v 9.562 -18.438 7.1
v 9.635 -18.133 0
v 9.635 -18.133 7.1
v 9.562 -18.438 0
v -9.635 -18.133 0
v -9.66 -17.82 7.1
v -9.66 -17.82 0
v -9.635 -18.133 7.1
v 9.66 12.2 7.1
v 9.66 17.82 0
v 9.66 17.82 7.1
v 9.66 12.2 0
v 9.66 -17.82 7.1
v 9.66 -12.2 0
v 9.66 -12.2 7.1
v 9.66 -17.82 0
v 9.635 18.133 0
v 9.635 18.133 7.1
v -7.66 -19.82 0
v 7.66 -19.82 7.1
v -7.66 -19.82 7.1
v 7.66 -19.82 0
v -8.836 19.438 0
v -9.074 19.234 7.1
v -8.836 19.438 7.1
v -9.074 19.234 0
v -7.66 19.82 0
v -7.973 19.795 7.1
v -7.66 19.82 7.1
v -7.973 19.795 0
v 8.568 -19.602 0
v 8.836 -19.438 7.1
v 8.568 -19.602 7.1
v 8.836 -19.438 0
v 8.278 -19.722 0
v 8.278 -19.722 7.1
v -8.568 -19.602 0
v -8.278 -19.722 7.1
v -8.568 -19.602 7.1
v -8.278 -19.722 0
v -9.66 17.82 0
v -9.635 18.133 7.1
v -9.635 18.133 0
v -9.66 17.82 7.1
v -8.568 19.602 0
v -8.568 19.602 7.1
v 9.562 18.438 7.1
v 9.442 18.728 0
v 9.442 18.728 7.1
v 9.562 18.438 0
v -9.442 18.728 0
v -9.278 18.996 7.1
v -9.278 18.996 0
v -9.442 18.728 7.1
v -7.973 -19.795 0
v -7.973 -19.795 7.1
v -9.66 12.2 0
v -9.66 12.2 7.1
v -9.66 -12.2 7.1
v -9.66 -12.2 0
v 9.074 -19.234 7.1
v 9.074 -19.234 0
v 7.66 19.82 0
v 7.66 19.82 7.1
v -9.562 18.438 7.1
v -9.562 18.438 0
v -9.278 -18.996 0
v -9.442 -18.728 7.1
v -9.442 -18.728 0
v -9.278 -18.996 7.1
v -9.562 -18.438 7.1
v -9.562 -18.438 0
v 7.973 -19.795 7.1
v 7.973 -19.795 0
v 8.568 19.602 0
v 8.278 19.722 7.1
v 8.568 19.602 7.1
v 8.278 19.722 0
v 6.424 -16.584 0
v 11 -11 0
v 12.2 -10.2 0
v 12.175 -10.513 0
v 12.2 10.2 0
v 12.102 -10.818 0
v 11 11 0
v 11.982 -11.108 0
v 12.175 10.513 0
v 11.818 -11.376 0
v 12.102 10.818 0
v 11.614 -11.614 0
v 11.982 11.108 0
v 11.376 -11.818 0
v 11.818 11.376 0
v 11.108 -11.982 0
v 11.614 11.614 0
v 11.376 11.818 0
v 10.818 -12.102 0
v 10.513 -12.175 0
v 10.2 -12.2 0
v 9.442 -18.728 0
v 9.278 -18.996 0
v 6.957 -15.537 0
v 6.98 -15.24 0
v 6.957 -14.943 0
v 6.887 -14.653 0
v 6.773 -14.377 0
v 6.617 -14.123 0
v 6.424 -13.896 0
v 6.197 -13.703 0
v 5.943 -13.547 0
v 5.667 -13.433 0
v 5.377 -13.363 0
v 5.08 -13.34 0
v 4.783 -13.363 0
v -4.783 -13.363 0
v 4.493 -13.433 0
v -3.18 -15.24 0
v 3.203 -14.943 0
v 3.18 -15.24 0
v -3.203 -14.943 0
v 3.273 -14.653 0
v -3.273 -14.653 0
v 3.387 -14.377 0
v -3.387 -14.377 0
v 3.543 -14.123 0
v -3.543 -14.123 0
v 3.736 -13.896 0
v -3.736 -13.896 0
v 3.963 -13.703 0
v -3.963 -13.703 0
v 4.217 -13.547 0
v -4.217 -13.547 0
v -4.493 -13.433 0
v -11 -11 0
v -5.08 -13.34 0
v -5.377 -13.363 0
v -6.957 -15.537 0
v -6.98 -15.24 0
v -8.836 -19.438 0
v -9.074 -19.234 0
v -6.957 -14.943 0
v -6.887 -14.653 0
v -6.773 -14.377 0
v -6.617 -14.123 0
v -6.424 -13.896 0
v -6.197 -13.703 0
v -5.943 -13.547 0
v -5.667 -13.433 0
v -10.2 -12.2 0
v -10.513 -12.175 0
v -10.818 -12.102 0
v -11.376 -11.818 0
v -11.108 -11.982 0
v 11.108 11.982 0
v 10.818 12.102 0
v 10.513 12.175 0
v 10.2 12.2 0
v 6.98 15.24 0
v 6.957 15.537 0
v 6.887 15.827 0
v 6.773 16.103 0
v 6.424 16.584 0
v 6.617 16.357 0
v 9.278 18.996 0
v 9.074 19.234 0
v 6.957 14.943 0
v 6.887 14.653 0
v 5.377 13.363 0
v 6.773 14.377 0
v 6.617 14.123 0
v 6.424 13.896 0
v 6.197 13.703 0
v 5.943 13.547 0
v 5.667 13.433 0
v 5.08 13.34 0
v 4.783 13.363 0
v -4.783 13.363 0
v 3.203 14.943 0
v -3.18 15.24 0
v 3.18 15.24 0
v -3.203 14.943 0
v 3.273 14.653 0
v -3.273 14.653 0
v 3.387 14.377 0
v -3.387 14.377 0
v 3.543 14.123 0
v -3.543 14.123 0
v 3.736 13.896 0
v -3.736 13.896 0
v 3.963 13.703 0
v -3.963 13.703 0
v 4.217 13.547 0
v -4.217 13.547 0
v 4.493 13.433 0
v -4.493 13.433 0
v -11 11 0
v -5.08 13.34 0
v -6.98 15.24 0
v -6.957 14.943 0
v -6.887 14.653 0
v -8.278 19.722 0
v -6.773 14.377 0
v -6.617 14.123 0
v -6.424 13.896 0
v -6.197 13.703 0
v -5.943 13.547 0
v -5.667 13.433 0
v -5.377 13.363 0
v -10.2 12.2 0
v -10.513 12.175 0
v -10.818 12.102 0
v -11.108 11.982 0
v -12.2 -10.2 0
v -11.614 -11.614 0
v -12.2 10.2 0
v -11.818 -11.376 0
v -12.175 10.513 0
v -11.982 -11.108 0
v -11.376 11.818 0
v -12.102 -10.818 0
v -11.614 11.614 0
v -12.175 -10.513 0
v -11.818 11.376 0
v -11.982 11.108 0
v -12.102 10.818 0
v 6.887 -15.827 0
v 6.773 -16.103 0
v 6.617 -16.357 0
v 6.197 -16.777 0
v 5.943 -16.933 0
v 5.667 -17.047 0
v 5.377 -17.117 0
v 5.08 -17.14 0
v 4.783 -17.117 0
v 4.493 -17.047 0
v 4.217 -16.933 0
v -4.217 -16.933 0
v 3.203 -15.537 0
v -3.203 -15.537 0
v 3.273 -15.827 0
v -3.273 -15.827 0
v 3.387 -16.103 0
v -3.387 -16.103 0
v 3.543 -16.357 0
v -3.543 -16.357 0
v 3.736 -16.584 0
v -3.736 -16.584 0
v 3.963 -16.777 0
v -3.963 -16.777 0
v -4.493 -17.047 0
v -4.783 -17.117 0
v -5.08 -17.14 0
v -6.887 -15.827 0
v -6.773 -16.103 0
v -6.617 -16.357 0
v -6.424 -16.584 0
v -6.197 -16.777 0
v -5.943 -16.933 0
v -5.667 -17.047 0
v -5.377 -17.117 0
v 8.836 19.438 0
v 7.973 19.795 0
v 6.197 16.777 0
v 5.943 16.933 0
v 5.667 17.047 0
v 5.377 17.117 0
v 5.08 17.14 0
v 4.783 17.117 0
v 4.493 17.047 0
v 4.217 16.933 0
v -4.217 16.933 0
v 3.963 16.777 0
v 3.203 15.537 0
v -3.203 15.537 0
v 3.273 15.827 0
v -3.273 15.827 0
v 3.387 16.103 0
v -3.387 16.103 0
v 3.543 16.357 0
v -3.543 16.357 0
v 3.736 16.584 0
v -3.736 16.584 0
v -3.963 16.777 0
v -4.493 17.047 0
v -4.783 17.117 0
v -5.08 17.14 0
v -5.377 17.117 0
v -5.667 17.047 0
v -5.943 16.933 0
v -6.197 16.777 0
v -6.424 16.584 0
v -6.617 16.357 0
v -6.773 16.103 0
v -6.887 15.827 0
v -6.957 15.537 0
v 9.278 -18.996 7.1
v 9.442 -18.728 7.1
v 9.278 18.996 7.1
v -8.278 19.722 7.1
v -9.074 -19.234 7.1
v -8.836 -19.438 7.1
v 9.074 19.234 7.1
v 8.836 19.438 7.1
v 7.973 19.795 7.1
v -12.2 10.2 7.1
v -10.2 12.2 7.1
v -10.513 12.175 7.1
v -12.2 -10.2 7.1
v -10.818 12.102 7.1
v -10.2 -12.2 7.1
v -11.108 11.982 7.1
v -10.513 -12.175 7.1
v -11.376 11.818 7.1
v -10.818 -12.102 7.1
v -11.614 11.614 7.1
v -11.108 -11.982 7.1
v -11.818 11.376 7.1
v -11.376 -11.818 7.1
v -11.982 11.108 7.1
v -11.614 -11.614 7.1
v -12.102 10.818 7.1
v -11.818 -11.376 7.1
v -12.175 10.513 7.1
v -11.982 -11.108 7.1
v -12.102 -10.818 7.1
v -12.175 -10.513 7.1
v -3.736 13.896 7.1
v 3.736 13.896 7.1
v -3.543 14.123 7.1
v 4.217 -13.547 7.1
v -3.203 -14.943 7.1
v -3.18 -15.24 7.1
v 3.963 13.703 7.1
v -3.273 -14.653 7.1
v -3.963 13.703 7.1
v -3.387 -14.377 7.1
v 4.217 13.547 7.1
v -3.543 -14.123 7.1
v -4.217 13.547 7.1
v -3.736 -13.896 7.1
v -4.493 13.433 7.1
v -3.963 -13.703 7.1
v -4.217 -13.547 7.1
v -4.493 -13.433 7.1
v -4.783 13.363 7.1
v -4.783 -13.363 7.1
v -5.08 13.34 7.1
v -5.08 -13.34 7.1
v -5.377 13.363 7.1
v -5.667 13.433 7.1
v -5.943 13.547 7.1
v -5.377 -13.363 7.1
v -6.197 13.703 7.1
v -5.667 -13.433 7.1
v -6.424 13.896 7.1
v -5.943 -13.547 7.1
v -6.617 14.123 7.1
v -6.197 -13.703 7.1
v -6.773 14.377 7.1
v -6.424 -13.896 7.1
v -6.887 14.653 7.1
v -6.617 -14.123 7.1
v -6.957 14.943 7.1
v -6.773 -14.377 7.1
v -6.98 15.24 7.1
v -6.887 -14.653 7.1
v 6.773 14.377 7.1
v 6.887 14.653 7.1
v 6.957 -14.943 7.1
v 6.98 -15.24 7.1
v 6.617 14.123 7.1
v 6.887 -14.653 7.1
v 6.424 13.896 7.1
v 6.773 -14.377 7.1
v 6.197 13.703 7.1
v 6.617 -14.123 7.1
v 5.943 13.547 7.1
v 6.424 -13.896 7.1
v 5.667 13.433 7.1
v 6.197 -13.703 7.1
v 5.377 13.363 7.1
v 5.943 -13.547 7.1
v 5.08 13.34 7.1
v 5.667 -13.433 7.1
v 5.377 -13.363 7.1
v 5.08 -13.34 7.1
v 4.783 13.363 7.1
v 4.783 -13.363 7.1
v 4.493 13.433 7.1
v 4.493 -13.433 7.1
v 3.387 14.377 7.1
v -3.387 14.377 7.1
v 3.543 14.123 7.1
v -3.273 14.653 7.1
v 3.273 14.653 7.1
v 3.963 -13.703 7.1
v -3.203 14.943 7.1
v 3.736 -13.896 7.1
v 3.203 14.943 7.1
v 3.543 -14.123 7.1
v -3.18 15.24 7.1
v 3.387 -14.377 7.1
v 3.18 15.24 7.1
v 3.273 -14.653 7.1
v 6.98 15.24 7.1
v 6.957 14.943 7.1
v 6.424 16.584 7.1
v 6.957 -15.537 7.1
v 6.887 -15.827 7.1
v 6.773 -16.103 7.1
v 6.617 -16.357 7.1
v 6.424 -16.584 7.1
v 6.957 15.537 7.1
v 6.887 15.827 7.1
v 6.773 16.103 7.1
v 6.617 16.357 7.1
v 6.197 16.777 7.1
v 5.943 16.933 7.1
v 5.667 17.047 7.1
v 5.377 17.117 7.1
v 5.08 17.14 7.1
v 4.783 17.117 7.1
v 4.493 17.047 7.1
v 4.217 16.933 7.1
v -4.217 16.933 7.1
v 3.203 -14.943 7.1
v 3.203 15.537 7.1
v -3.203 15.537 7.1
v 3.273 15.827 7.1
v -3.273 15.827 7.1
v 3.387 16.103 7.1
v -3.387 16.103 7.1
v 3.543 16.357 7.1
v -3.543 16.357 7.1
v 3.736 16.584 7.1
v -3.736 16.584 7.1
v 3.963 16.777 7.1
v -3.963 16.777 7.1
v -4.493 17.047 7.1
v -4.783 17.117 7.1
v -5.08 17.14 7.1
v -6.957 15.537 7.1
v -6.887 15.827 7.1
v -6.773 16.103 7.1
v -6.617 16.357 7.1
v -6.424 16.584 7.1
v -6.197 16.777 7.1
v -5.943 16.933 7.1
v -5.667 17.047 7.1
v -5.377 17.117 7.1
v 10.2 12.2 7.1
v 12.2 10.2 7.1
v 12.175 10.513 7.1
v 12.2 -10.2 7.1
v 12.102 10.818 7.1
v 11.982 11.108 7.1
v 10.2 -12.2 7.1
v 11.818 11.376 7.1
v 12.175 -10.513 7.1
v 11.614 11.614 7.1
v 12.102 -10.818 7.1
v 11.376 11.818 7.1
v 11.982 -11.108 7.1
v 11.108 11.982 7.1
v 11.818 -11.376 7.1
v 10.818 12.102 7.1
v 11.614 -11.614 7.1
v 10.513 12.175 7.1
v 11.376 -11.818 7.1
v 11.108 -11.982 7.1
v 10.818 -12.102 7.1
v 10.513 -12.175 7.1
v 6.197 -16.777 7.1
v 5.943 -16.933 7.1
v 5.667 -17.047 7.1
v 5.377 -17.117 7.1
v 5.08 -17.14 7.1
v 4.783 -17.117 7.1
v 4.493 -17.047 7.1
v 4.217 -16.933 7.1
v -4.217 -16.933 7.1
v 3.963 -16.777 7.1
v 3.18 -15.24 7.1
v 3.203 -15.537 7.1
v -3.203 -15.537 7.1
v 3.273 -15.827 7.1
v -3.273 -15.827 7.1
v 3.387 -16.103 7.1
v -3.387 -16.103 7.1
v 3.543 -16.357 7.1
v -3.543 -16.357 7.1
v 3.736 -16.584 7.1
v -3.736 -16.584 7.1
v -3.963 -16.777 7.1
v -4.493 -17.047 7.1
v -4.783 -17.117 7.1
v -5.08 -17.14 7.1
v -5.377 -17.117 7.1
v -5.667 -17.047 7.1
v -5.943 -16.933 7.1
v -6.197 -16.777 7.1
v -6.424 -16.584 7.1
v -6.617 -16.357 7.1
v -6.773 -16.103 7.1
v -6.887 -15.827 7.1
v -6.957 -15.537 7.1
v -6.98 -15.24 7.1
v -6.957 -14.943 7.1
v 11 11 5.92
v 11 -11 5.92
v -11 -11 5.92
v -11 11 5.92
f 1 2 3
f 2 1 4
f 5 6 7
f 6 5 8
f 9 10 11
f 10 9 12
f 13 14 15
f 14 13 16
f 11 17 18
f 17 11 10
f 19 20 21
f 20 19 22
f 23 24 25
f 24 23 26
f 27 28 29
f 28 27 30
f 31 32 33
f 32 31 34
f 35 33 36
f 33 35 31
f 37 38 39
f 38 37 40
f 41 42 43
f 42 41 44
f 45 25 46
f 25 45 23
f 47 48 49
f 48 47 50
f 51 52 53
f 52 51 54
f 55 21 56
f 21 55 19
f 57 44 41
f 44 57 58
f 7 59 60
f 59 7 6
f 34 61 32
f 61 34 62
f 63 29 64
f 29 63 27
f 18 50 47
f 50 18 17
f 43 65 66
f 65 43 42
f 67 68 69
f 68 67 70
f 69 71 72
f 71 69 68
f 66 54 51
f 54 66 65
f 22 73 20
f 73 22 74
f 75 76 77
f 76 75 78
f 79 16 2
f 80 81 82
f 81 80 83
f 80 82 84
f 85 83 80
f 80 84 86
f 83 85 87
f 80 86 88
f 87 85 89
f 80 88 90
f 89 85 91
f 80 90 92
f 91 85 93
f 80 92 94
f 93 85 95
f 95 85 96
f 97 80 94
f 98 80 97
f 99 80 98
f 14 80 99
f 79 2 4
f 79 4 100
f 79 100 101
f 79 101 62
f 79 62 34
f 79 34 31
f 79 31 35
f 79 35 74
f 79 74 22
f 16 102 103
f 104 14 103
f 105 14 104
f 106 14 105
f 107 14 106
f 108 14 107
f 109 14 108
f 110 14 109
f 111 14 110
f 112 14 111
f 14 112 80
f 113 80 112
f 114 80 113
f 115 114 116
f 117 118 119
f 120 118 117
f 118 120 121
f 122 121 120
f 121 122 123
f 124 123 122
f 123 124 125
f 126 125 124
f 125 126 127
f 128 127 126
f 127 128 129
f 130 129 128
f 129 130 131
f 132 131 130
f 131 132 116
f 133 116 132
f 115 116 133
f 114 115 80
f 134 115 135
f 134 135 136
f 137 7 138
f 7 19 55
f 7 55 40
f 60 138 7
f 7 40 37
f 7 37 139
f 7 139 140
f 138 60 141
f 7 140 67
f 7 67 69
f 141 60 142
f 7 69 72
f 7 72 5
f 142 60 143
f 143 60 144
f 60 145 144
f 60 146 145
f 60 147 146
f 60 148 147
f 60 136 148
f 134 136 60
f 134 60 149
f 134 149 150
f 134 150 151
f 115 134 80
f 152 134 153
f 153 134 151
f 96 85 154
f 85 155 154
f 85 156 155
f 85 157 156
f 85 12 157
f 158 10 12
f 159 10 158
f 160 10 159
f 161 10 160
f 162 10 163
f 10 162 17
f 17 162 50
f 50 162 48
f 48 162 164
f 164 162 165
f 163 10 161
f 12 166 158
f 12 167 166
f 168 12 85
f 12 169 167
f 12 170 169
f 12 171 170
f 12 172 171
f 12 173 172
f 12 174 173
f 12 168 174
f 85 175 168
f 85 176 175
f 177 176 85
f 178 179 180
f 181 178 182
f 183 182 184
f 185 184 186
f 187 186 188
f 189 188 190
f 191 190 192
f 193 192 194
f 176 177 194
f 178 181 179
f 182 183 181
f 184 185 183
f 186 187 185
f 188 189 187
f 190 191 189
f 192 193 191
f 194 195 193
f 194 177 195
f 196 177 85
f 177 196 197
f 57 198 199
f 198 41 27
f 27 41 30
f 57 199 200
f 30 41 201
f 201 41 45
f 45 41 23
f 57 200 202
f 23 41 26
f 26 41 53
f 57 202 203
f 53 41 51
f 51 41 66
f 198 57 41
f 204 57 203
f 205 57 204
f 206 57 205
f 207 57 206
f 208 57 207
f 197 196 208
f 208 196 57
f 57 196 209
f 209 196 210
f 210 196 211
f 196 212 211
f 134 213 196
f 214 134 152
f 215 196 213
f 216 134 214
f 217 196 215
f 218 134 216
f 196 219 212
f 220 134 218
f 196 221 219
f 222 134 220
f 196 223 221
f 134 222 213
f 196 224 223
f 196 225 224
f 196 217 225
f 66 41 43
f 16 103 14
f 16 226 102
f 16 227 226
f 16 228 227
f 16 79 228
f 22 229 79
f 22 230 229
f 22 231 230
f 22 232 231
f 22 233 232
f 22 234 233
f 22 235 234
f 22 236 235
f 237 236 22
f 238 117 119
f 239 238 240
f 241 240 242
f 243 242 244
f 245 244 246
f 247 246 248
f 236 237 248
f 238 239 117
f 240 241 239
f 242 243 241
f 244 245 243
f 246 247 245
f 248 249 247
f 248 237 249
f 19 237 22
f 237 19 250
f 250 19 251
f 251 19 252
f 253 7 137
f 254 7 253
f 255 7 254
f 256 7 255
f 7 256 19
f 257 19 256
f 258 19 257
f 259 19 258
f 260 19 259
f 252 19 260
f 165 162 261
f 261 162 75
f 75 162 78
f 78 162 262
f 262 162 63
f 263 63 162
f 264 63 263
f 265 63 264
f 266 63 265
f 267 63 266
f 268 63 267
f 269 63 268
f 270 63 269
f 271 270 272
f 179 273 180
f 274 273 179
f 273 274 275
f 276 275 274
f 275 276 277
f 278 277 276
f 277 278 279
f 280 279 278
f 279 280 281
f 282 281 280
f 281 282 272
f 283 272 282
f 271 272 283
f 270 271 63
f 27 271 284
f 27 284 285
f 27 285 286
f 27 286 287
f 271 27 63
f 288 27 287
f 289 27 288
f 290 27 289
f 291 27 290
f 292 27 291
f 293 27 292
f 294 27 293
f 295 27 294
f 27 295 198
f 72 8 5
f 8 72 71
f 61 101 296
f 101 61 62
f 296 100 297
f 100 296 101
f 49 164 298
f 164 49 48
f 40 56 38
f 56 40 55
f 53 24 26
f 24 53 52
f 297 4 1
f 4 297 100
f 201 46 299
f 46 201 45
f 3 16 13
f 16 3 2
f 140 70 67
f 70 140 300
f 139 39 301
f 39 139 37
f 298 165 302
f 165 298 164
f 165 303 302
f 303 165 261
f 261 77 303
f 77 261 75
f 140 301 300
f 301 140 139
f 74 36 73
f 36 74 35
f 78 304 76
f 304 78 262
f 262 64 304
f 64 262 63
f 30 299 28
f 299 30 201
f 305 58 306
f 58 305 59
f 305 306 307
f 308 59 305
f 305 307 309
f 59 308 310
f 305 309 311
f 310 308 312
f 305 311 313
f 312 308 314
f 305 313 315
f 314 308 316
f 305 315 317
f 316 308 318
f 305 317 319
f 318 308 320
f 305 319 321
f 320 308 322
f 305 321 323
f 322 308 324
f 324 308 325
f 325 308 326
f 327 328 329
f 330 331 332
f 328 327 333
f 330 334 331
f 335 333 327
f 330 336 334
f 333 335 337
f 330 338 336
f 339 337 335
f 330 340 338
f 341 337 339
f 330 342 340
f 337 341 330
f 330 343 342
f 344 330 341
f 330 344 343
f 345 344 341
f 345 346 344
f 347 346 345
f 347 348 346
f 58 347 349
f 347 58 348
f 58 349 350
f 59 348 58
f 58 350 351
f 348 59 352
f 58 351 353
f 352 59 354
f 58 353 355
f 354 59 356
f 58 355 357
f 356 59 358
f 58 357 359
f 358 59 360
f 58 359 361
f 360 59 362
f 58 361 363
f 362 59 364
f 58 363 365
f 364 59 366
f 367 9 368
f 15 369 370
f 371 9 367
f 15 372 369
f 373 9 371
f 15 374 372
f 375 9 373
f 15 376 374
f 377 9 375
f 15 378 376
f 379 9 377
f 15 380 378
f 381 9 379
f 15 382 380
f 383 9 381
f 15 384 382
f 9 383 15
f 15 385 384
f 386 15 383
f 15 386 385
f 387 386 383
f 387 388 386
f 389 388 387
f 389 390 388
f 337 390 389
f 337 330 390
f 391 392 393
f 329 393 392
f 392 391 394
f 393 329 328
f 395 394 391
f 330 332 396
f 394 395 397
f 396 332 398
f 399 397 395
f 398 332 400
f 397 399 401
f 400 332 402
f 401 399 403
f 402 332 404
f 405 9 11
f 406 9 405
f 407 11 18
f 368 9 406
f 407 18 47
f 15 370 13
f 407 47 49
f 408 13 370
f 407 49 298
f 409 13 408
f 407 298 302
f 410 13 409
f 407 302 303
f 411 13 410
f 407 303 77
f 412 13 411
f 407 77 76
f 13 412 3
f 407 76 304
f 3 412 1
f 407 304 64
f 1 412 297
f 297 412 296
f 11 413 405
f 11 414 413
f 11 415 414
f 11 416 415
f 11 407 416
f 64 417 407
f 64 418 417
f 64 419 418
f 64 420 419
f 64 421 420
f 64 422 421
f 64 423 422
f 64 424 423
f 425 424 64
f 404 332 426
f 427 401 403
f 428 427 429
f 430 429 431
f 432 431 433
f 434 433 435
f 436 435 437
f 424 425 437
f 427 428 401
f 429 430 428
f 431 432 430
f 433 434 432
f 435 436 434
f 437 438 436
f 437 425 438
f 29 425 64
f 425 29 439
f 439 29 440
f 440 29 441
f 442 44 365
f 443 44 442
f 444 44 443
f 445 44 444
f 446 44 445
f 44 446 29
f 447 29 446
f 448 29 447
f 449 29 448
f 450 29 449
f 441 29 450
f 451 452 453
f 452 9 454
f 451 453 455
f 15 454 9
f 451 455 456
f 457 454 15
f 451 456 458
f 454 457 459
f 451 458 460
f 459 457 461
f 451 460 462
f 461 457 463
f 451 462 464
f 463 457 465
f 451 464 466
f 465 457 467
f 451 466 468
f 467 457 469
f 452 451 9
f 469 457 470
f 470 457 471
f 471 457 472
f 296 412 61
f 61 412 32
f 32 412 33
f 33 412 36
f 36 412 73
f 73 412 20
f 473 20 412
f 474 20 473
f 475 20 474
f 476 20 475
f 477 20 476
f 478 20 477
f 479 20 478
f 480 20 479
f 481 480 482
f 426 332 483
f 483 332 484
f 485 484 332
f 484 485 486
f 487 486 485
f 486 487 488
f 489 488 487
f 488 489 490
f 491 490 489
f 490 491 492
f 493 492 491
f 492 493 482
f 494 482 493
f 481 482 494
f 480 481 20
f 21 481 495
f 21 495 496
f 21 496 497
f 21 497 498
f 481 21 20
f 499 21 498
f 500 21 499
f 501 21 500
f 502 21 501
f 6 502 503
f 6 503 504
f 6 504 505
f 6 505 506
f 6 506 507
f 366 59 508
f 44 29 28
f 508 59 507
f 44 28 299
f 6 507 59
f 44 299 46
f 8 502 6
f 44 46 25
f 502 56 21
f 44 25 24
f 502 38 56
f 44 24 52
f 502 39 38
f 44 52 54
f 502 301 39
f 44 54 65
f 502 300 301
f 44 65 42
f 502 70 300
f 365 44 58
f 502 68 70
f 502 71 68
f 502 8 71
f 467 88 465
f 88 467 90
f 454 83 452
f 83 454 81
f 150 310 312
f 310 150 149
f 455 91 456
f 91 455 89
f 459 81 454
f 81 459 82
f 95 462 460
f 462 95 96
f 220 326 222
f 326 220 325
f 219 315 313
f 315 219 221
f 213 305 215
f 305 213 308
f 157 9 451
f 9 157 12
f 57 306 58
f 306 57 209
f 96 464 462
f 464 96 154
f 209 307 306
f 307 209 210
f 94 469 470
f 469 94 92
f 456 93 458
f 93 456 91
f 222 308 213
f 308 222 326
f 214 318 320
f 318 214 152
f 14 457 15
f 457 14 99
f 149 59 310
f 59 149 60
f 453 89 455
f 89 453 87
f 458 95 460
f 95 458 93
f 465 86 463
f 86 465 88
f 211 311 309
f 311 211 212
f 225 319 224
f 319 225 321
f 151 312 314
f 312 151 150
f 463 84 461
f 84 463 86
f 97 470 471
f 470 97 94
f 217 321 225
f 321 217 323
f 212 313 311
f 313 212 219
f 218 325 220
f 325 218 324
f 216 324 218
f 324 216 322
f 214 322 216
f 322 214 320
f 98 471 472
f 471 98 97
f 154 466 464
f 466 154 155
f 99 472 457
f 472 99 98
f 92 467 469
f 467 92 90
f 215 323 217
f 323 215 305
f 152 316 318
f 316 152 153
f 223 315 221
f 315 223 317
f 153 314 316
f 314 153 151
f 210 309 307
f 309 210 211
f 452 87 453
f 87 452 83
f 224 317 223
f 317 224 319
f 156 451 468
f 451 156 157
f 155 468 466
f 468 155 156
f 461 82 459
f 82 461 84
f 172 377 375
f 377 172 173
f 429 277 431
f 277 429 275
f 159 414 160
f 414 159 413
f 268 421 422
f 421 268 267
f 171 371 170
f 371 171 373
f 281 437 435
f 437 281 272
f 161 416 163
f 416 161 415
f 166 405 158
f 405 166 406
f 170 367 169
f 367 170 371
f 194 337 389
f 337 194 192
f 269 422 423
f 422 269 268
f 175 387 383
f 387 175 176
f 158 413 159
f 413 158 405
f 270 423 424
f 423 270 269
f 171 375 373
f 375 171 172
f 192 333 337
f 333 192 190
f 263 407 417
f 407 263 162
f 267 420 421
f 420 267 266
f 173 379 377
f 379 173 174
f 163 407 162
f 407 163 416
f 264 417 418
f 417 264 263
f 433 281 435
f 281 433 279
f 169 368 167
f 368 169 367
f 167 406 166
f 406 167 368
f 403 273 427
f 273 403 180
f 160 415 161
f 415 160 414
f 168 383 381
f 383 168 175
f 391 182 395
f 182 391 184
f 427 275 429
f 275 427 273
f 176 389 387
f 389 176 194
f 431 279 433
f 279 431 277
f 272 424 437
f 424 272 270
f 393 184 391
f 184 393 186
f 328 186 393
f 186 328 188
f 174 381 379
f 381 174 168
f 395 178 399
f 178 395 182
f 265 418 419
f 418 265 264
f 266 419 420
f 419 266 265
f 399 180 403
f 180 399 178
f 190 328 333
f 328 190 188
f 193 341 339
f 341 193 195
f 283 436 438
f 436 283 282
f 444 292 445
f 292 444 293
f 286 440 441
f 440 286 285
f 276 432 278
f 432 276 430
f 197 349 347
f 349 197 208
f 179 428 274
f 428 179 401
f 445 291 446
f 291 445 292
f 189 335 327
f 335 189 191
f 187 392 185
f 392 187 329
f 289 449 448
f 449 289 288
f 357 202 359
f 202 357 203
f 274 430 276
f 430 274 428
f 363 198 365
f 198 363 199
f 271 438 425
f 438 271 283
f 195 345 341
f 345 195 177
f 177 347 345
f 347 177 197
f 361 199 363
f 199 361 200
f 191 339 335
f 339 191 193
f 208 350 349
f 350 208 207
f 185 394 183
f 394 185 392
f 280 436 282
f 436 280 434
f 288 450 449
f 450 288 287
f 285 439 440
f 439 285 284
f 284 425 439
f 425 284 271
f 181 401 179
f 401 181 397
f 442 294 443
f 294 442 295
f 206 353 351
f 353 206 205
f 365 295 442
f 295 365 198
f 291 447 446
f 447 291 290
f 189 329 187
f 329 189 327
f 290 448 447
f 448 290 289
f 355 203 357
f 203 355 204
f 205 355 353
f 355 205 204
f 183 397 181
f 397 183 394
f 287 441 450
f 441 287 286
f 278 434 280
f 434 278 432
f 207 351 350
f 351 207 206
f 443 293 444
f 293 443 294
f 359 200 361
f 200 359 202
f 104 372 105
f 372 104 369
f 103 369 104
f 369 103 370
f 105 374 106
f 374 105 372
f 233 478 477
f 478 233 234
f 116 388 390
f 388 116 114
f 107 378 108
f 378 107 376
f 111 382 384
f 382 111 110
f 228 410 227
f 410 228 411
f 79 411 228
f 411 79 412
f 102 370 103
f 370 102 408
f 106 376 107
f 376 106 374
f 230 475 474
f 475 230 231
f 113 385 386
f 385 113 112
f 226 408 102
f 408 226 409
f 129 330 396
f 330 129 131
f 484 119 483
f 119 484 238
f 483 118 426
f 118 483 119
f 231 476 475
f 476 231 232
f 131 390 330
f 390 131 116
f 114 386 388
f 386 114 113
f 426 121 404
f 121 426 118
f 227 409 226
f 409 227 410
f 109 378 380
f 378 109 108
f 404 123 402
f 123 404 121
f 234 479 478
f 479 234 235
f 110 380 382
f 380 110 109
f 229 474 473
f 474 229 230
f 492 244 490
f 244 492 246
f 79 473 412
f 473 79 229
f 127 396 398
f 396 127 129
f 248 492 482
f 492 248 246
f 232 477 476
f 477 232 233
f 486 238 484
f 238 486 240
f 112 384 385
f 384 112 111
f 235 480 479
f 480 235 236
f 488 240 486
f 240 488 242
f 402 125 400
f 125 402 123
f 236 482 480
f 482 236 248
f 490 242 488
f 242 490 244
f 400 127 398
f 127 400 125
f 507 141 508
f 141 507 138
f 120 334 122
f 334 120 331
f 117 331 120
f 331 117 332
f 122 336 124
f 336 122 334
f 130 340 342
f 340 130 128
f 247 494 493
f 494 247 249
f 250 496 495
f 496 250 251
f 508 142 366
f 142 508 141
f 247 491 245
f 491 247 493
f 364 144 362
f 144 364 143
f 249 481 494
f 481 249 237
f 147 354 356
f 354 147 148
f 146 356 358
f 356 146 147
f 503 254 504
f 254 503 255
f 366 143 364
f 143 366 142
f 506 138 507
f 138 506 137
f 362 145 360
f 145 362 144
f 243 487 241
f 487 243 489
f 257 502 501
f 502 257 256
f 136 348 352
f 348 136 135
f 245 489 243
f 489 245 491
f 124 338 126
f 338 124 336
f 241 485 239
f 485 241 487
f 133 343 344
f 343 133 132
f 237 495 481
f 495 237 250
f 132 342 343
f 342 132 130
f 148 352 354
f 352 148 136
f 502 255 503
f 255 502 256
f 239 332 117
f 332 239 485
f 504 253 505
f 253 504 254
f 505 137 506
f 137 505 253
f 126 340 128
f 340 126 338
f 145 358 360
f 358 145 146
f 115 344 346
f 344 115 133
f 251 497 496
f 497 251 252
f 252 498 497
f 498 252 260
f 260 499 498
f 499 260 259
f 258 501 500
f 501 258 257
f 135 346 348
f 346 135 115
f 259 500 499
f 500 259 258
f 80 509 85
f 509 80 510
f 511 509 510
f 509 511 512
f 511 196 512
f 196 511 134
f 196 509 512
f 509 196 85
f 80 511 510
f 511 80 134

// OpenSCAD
// file: ../configuration.scad
$fn=40; // model faces resolution.

//OBECNE PARAMETRY 
//----------------------------------------------------------------
//----------------------------------------------------------------

vyska_krystalu=15;
vyska_sipm=2;
presah_krystalu=6;
rezerva_nad_krystalem=5;
vyska_drzaku_krystalu=vyska_krystalu-presah_krystalu-2;

hrana_krystalu=6; //čistá hrana

// big-big
//zakladna_krystalu_x=23.7; //1.5mm rezerva hrana SIPM je 22 mm
//zakladna_krystalu_y=23.7;
// big-small
zakladna_krystalu_x=22.0; //1.5mm rezerva hrana SIPM je 22 mm
zakladna_krystalu_y=22.0;
sila_steny=1.2;
sila_materialu_zakladny=7; //1.6;


vyska_zapusti_pro_PCB=0; //výčka krycího matriálu pro PCB a zároveň pro vytvoření vany pro zalití silikonem, kvůli světlotěsnoti.
vyska_SIPM_nad_PCB=2.4; //výška celého SIPM senzoru
tolerance_pro_dotazeni_k_SIPM=-0.5; // kvůli dotažení krystalu k SIPM
velikost_modulu_x=2; //počet der
velikost_modulu_y=4;
rotec_der_modulu=10.16;

vyska_matky=3;
sirka_matky=6.7;
prumer_sroubu=3.6;//3.4;
prumer_hlavy_sroubu=6;
vyska_hlavy_sroubu=5;

//Pro díl SIPMBOX01C_D02
D02_velikost_modulu_x=3; //počet der
D02_velikost_modulu_y=4;
D02_vyska_bocniho_prekryvu=25;

//Pro díl SIPMBOX01C_D07
D07_vyska=6;
// main file
use <../src/SIPMBOX01C.scad>

include <../configuration.scad>

SIPMBOX01C_D01();
